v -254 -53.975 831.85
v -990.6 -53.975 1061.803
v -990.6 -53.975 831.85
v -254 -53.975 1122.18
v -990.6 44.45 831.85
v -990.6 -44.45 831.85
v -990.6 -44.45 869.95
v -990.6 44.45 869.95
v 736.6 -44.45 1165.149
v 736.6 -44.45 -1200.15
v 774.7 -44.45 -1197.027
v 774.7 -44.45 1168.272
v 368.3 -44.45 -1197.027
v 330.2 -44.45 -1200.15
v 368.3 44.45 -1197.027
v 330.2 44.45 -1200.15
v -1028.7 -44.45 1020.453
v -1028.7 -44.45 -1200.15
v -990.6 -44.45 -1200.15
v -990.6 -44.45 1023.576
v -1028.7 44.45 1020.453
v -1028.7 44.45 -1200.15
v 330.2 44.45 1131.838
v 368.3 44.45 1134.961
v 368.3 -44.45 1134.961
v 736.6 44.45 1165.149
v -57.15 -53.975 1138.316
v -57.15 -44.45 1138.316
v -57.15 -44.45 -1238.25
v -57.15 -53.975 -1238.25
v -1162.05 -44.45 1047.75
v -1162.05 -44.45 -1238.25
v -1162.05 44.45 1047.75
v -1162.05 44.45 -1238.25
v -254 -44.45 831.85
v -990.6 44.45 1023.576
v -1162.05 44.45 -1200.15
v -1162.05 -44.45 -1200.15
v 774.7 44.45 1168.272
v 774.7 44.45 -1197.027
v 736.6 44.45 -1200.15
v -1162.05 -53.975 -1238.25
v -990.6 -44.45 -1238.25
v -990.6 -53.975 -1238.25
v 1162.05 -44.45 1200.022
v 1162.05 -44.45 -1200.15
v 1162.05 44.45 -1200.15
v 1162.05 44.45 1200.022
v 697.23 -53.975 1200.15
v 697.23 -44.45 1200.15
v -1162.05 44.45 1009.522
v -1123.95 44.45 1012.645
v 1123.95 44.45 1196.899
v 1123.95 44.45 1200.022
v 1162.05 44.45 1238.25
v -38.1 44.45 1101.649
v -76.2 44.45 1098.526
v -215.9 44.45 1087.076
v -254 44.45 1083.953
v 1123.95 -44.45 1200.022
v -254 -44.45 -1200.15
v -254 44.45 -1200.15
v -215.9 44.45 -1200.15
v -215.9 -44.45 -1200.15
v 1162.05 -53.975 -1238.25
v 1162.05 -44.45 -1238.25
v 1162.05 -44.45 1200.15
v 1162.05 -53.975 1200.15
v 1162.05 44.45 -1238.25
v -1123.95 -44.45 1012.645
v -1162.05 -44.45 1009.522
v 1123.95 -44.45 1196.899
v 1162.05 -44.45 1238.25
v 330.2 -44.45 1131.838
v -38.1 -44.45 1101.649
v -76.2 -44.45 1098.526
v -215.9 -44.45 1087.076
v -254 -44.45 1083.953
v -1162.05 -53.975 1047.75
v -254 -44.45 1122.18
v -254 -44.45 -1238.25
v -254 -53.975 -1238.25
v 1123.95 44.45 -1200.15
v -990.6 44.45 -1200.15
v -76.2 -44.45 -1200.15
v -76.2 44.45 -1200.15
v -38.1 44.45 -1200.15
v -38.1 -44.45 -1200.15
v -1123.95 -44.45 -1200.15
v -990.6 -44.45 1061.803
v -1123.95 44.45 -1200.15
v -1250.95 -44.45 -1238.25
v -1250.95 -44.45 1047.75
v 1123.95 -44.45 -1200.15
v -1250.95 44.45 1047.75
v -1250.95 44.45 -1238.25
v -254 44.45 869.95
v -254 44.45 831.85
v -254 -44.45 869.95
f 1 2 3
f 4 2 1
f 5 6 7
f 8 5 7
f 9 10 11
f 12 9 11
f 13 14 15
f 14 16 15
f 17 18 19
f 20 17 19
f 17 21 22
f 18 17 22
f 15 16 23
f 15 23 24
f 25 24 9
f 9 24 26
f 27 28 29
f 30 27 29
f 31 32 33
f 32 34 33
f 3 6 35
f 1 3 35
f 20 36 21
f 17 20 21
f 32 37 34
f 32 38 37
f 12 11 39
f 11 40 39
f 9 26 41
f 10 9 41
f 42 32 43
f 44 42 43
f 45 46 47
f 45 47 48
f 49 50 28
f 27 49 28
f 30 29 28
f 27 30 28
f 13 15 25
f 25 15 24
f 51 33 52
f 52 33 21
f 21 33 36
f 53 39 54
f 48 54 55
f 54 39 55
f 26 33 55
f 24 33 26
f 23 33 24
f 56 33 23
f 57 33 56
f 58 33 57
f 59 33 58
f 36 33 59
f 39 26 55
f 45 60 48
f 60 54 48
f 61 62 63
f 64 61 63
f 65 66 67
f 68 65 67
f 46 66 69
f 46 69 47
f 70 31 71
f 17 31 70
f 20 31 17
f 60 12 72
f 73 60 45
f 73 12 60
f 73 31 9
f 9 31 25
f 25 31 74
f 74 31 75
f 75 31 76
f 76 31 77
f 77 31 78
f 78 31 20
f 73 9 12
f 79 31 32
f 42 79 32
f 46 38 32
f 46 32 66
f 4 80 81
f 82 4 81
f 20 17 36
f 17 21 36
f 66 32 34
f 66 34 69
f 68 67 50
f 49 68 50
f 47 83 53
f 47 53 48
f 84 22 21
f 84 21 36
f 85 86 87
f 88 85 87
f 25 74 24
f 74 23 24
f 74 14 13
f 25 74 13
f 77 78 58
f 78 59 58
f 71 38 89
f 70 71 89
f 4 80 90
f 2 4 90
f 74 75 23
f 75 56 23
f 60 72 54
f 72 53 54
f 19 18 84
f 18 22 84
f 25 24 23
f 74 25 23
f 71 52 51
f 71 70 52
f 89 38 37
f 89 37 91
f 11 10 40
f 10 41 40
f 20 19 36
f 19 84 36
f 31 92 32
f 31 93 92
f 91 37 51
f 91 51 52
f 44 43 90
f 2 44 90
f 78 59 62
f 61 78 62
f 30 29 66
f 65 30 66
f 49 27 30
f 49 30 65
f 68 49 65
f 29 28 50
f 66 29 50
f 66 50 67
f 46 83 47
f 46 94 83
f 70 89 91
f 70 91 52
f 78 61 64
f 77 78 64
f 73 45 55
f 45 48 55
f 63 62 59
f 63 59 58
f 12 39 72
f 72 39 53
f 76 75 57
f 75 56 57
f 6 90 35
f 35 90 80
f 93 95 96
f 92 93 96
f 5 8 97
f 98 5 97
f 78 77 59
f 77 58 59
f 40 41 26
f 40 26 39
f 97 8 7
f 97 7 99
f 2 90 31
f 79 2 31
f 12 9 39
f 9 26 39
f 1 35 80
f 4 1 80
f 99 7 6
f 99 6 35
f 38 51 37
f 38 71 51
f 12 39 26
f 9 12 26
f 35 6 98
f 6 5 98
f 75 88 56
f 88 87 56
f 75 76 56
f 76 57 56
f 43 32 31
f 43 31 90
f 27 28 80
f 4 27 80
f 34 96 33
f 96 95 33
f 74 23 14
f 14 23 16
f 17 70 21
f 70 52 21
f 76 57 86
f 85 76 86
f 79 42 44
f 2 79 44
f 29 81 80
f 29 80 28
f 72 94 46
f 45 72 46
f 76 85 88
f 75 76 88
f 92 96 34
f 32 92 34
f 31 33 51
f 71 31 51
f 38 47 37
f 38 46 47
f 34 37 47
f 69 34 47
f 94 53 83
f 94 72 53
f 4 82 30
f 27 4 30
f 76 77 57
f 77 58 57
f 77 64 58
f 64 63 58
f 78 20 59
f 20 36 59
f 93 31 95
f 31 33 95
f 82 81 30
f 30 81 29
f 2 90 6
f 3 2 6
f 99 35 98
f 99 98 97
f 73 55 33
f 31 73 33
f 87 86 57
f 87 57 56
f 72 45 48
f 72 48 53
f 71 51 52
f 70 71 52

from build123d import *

# Parameters (mm, degrees)
F1_DEPTH = 44.45
F0_W     = 736.6
F0_H     = 38.1
F2_DEPTH = 44.45
F3_DEPTH = 44.45
F4_W     = 171.45
F4_H     = 38.1
F4_W_2   = 196.85
F5_DEPTH = 9.525
F4_W_3   = 1219.2
F6_DEPTH = 9.525


with BuildPart() as f1:
    # F0 (on Front) → F1 (new body, symmetric)
    with BuildSketch(Plane.XZ):
        Polygon((-1250.95, -1238.25), (-1162.05, -1238.25), (-1162.05, -1200.15), (-1162.05, 1009.522224), (-1162.05, 1013.384365), (-1162.05, 1047.75), (-1250.95, 1047.75), align=None)
        Polygon((-1028.7, 1020.452552), (-1028.7, -1200.15), (-990.6, -1200.15), (-990.6, 831.85), (-990.6, 869.95), (-990.6, 1023.575503), align=None)
        Polygon((-254, 831.85), (-254, -1200.15), (-215.9, -1200.15), (-215.9, 1087.075503), (-254, 1083.952552), (-254, 869.95), align=None)
        Polygon((-76.2, -1200.15), (-38.1, -1200.15), (-38.1, 1101.649274), (-76.2, 1098.526323), align=None)
        Polygon((330.2, 1131.837798), (330.2, -1200.15), (368.3, -1197.027049), (368.3, 1134.960749), align=None)
        Polygon((736.6, 1165.149274), (736.6, -1200.15), (774.7, -1197.027049), (774.7, 1168.272224), align=None)
        Polygon((1123.95, -1200.15), (1162.05, -1200.15), (1162.05, 1200.022224), (1123.95, 1196.899274), align=None)
    extrude(amount=F1_DEPTH, both=True)


with BuildPart() as f2:
    # F0 (on Front) → F2 (new body, symmetric)
    with BuildSketch(Plane.XZ):
        Polygon((-1162.05, 1013.384365), (-1162.05, 1009.522224), (-1123.95, 1012.645175), (-1028.7, 1020.452552), (-990.6, 1023.575503), (-254, 1083.952552), (-215.9, 1087.075503), (-76.2, 1098.526323), (-38.1, 1101.649274), (330.2, 1131.837798), (368.3, 1134.960749), (736.6, 1165.149274), (774.7, 1168.272224), (1123.95, 1196.899274), (1123.95, 1200.022224), (1162.05, 1200.022224), (1162.05, 1238.25), (-1162.05, 1047.75), align=None)
        with Locations((-622.3, 850.9)):
            Rectangle(F0_W, F0_H)
        Polygon((-1162.05, -1200.15), (-1162.05, -1238.25), (1162.05, -1238.25), (1162.05, -1200.15), (1123.95, -1200.15), (736.6, -1200.15), (330.2, -1200.15), (-38.1, -1200.15), (-76.2, -1200.15), (-215.9, -1200.15), (-254, -1200.15), (-990.6, -1200.15), (-1028.7, -1200.15), (-1114.931886, -1200.15), (-1123.95, -1200.15), align=None)
    extrude(amount=F2_DEPTH, both=True)


with BuildPart() as f3:
    # F0 (on Front) → F3 (new body, symmetric)
    with BuildSketch(Plane.XZ):
        Polygon((-1162.05, 1009.522224), (-1162.05, -1200.15), (-1123.95, -1200.15), (-1123.95, 1012.645175), align=None)
    extrude(amount=F3_DEPTH, both=True)


with BuildPart() as f5:
    # F4 (on face) → F5 (new body)
    with BuildSketch(Plane.XZ.offset(44.45)):
        Polygon((-1162.05, -1200.15), (-990.6, -1200.15), (-990.6, 831.85), (-990.6, 1023.575503), (-990.6, 1061.803279), (-1162.05, 1047.75), align=None)
        Polygon((-254, -1200.15), (-57.15, -1200.15), (-57.15, 1138.315574), (-254, 1122.180328), (-254, 1083.952552), (-254, 831.85), align=None)
        with Locations((-1076.325, -1219.2)):
            Rectangle(F4_W, F4_H)
        with Locations((-155.575, -1219.2)):
            Rectangle(F4_W_2, F4_H)
    extrude(amount=F5_DEPTH)


with BuildPart() as f6:
    # F4 (on face) → F6 (new body)
    with BuildSketch(Plane.XZ.offset(44.45)):
        Polygon((-254, 1083.952552), (-254, 1122.180328), (-990.6, 1061.803279), (-990.6, 1023.575503), (-990.6, 831.85), (-254, 831.85), align=None)
        Polygon((-57.15, -1200.15), (1162.05, -1200.15), (1162.05, 1200.15), (697.23, 1200.15), (-57.15, 1138.315574), align=None)
        with Locations((552.45, -1219.2)):
            Rectangle(F4_W_3, F4_H)
    extrude(amount=F6_DEPTH)


solid = Compound([f1.part, f2.part, f3.part, f5.part, f6.part])
